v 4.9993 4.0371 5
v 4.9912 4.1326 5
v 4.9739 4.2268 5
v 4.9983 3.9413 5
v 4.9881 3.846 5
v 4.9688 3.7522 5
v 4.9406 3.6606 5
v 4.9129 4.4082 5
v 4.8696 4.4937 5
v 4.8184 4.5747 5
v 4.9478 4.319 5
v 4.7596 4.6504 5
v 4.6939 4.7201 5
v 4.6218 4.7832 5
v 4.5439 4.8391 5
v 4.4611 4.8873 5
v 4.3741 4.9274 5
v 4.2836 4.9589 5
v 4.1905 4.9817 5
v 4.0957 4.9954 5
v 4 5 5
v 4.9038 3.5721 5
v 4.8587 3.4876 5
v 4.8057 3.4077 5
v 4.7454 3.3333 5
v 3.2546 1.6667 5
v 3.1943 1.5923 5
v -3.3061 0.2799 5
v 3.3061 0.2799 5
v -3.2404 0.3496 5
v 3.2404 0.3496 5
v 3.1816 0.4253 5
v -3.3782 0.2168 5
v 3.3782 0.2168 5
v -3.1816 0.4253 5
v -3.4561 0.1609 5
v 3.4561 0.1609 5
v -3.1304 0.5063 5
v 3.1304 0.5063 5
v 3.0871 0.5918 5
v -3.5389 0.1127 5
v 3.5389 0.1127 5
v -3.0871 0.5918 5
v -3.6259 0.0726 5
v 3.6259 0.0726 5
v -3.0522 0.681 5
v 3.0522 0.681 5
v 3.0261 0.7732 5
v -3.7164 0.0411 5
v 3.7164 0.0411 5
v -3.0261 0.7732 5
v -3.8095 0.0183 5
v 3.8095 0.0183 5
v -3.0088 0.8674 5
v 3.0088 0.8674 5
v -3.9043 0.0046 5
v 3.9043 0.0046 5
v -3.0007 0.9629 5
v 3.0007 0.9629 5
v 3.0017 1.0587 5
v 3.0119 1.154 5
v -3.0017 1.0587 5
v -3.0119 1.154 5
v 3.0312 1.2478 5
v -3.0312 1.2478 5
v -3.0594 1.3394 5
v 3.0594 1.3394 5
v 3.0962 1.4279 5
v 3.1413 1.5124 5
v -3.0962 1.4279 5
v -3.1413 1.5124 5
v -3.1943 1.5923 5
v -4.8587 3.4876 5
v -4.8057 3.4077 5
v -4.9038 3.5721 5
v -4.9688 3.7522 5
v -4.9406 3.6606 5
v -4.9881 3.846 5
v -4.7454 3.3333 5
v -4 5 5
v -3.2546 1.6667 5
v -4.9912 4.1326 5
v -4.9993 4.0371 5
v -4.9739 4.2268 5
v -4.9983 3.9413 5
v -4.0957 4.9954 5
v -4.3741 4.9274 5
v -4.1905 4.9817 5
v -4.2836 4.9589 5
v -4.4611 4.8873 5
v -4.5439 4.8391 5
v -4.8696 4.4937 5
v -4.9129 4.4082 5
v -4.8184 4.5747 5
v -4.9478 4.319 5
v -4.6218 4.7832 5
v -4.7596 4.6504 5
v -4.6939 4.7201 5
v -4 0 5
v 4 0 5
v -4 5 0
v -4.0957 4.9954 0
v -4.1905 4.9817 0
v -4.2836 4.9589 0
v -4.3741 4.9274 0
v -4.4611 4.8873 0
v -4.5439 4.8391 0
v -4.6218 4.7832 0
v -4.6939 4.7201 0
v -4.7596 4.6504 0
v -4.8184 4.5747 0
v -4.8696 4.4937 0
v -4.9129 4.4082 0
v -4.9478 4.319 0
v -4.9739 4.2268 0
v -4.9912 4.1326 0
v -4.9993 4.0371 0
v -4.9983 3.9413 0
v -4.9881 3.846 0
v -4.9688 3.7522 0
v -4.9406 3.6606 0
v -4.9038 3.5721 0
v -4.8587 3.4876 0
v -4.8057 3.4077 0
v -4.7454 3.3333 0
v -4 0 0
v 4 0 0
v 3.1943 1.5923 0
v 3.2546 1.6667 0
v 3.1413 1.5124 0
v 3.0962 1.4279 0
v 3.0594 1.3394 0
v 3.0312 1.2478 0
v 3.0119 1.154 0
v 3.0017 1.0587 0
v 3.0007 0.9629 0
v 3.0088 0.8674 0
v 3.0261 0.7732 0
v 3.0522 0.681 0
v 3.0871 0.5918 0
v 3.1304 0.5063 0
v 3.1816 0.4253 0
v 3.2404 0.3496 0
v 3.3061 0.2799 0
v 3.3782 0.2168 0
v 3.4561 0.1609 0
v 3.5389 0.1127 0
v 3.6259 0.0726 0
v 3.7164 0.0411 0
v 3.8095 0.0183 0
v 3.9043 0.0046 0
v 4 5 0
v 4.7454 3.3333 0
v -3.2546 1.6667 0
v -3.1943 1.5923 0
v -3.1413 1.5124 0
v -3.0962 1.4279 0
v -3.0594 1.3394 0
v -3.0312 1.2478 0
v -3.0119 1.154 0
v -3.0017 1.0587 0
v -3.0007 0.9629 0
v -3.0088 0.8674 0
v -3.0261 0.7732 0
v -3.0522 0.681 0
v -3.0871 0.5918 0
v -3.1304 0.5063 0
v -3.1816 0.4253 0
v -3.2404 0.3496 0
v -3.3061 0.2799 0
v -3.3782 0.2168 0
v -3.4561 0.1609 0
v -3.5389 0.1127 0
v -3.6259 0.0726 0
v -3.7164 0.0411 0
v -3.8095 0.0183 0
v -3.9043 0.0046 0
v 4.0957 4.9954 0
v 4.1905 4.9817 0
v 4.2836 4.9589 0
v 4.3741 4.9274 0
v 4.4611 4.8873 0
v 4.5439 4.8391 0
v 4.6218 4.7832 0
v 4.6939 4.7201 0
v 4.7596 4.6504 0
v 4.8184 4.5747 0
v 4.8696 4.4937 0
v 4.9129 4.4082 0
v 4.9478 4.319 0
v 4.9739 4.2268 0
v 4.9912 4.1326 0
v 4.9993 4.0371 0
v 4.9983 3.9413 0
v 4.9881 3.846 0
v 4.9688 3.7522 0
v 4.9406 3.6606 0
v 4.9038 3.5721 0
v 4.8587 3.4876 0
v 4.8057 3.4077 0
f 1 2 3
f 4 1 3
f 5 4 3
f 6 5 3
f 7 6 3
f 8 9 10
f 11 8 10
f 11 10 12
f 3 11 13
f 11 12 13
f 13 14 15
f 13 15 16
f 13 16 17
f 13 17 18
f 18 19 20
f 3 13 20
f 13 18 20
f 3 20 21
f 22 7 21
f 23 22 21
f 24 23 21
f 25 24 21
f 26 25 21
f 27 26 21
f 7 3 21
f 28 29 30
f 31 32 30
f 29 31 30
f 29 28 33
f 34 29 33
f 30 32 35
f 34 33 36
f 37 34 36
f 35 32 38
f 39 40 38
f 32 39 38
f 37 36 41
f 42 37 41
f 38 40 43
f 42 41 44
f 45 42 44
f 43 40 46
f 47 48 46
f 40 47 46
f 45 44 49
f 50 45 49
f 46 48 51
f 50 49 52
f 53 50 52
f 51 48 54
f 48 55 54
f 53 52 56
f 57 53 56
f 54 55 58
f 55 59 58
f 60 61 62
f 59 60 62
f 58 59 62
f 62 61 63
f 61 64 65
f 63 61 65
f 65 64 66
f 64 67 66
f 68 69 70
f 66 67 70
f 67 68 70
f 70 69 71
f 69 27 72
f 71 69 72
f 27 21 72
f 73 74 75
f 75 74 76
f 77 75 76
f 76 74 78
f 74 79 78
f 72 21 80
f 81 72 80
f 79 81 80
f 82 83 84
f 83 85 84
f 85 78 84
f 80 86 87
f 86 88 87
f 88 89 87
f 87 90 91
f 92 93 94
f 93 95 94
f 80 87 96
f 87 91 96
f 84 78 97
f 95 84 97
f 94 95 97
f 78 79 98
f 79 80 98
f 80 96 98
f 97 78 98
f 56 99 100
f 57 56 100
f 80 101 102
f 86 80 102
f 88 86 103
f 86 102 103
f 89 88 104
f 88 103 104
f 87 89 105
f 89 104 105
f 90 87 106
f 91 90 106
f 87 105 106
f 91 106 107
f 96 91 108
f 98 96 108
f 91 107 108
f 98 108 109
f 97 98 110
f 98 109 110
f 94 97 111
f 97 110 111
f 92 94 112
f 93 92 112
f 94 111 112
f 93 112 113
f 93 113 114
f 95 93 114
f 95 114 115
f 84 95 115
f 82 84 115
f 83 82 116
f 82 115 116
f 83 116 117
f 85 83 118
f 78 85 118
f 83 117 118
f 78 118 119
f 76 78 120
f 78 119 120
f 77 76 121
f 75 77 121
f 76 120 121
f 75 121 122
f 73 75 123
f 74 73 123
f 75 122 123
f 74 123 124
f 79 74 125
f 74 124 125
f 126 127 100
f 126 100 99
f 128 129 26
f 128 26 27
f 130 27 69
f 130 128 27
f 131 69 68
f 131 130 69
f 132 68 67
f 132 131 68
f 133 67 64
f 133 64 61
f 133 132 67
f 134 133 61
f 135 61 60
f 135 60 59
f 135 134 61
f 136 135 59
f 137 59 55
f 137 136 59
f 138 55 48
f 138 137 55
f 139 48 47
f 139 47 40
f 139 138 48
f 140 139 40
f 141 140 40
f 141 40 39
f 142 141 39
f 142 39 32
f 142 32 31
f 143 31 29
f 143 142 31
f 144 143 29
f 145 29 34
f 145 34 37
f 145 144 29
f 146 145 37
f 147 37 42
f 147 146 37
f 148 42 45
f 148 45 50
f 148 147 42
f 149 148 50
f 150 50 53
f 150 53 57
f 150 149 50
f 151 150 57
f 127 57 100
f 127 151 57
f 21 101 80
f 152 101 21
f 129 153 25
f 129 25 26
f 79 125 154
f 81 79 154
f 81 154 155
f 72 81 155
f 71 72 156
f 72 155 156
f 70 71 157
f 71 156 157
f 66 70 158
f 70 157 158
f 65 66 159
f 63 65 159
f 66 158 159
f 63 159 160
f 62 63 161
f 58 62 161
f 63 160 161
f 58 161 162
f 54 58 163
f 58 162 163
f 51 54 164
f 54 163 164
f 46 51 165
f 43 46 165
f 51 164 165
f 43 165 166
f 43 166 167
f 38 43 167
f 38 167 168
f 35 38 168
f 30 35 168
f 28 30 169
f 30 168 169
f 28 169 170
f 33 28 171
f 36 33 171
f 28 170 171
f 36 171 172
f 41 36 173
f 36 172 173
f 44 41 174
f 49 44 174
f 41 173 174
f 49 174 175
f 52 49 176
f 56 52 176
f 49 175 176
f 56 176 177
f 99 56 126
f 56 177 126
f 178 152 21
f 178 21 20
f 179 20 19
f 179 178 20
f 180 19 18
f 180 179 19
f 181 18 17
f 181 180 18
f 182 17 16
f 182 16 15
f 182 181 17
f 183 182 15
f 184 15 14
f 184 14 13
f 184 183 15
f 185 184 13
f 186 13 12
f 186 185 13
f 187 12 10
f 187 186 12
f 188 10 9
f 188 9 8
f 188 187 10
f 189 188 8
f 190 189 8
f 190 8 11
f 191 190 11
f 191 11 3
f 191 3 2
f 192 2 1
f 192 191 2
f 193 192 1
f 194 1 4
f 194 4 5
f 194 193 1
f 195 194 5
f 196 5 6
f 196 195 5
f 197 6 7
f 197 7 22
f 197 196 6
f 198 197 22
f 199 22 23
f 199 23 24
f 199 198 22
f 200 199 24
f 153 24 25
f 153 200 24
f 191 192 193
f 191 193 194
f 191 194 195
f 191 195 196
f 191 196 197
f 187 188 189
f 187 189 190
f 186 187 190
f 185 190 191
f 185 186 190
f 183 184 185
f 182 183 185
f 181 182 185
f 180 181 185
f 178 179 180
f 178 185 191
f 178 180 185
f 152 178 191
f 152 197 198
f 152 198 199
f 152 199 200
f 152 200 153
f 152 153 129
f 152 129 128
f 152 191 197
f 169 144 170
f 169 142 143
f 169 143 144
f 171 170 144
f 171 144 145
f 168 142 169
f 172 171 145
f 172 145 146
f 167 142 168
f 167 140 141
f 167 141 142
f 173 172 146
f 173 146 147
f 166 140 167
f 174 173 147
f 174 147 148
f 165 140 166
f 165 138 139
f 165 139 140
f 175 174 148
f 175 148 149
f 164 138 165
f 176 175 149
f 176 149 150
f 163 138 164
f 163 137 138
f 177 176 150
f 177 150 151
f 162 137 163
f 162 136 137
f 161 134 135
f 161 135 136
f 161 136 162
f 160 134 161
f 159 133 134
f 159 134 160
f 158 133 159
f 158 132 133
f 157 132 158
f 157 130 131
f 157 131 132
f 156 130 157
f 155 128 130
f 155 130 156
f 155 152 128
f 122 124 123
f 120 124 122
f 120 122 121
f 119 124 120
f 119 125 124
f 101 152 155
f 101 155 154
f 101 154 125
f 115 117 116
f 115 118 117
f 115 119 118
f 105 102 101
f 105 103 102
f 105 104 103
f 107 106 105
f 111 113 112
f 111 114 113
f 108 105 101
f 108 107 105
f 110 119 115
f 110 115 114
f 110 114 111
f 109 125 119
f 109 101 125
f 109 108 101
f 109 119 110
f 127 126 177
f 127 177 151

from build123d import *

# Parameters (mm, degrees)
F1_DEPTH = 5


with BuildPart() as f1:
    # F0 (on Top) → F1 (new body)
    with BuildSketch(Plane.XY):
        with BuildLine():
            Line((0, 5), (-4, 5))
            ThreePointArc((-4, 5), (-4.912871, 4.408248), (-4.745356, 3.333333))
            Line((-4.745356, 3.333333), (-3.254644, 1.666667))
            ThreePointArc((-3.254644, 1.666667), (-3.087129, 0.591752), (-4, 0))
            Line((-4, 0), (0, 0))
            Line((0, 0), (0, 5))
        make_face()
    extrude(amount=F1_DEPTH)

    # F2: F1 across face


with BuildPart() as f1_1:
    add(f1.part)
    add(f1.part.mirror(Plane(origin=(0, 2.5, 2.5), x_dir=(0, 1, 0), z_dir=(1, 0, 0))))


solid = f1_1.part
